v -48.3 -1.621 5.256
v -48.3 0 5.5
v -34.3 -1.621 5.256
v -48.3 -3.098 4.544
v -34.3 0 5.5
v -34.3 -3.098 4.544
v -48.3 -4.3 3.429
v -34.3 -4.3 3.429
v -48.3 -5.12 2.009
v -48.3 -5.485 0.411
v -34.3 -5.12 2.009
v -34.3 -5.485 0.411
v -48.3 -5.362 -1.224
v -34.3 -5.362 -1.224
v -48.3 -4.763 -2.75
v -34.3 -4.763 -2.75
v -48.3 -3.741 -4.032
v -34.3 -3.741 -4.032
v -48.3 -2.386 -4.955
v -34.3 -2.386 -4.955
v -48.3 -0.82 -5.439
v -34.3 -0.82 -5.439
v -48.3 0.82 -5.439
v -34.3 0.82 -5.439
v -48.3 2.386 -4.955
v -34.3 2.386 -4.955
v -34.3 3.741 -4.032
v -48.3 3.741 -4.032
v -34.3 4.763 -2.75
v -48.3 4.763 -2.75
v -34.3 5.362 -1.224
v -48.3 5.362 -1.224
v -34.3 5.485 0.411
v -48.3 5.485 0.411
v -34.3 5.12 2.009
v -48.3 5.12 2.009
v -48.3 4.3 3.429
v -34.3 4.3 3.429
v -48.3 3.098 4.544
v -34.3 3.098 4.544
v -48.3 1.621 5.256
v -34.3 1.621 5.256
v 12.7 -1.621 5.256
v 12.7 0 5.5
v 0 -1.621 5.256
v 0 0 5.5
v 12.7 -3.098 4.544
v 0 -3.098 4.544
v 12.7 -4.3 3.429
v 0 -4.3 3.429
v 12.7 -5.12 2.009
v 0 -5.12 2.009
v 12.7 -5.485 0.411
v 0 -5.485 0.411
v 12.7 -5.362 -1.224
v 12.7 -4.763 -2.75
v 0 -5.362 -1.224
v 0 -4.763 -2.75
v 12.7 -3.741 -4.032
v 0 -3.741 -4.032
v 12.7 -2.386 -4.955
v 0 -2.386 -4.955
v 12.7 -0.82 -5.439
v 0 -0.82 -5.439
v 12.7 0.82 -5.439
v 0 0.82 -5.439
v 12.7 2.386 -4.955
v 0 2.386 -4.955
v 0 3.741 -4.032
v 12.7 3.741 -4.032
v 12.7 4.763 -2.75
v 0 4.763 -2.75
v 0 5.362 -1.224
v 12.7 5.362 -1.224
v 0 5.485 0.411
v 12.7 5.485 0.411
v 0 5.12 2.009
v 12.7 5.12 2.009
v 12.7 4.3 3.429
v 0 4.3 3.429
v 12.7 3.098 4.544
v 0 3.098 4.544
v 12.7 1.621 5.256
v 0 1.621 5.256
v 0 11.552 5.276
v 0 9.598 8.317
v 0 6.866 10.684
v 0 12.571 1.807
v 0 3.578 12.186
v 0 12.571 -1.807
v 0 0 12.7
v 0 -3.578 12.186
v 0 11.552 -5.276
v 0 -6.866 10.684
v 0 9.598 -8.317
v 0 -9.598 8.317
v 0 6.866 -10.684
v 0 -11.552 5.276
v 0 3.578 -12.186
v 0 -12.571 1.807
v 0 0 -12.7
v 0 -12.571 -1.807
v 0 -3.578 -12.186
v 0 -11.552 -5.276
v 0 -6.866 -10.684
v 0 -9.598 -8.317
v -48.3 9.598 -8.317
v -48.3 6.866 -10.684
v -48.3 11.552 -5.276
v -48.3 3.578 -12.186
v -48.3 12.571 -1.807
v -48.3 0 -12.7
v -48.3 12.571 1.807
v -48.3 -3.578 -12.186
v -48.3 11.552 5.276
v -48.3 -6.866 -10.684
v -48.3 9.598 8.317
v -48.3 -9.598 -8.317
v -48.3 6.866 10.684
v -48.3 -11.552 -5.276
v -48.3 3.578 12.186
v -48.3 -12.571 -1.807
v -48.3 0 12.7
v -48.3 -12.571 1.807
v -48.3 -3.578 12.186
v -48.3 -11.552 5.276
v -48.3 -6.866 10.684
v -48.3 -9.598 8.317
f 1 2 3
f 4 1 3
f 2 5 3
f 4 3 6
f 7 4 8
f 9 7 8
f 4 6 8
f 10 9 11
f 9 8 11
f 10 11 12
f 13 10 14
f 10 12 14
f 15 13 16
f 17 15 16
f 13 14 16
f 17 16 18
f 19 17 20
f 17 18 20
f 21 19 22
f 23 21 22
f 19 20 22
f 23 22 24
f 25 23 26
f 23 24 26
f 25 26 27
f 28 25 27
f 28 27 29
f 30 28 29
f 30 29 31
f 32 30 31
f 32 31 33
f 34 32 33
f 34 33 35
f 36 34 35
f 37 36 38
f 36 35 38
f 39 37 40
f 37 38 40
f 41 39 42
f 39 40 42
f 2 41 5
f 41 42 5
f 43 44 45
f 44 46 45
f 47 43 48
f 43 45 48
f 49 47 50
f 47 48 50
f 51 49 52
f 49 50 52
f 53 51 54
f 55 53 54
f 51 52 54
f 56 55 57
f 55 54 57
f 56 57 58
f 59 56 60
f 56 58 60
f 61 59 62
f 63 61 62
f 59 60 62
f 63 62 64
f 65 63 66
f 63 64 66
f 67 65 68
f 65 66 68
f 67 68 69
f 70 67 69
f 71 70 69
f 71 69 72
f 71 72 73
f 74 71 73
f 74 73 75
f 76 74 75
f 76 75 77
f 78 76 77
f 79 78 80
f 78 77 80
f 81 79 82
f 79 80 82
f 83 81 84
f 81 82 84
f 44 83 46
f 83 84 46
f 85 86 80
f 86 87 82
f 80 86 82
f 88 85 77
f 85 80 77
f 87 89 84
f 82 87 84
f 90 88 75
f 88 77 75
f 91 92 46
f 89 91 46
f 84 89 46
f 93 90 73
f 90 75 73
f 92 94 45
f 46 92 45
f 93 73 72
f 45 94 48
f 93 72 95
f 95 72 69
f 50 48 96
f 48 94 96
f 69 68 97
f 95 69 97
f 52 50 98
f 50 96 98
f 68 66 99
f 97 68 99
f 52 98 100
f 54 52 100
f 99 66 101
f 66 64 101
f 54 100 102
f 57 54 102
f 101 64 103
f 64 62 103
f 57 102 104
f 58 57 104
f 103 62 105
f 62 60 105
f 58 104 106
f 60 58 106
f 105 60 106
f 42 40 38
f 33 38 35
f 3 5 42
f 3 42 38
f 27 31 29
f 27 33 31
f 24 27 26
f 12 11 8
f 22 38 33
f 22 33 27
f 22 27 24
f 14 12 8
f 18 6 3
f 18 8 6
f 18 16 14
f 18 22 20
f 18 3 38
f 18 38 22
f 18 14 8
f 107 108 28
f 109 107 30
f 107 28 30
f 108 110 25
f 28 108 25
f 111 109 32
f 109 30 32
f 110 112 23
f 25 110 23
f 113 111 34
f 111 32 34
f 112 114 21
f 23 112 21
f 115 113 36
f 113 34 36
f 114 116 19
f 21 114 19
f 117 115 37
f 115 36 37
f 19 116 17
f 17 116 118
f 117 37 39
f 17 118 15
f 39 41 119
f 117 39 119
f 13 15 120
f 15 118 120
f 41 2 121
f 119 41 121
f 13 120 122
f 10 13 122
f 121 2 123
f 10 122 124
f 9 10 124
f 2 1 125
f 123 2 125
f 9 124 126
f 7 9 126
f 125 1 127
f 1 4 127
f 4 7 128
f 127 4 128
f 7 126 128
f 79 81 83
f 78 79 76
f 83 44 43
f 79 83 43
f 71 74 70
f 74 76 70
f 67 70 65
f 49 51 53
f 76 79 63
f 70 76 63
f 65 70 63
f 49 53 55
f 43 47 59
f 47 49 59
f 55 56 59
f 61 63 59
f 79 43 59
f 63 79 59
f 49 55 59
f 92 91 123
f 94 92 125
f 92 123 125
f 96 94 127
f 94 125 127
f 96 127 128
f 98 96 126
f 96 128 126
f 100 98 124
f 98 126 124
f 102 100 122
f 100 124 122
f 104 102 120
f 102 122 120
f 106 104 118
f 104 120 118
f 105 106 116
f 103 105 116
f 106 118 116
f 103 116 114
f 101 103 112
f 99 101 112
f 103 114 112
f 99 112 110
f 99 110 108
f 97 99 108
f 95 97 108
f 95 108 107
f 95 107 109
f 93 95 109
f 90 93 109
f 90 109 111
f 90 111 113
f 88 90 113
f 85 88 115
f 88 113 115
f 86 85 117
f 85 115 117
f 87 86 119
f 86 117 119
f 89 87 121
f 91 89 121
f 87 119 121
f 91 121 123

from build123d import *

# Parameters (mm, degrees)
SOCKET_1_SKETCH_W = 15
SOCKET_1_SKETCH_H = 5.5


with BuildPart() as part:
    # CV_Nuvair Sketch → CV_Nuvair (revolve)
    with BuildSketch(Plane.XY):
        Polygon((12.7, 0), (12.7, 5.5), (0, 5.5), (0, 12.7), (-48.3, 12.7), (-48.3, 0), align=None)
    revolve(axis=Axis((-1000, 0, 0), (1, 0, 0)))

    # Socket 1 Sketch → Socket 1 (revolve, cut)
    with BuildSketch(Plane.XY):
        with Locations((-41.8, 2.75)):
            Rectangle(SOCKET_1_SKETCH_W, SOCKET_1_SKETCH_H)
    revolve(axis=Axis((-1000, 0, 0), (1, 0, 0)), mode=Mode.SUBTRACT)


solid = part.part
